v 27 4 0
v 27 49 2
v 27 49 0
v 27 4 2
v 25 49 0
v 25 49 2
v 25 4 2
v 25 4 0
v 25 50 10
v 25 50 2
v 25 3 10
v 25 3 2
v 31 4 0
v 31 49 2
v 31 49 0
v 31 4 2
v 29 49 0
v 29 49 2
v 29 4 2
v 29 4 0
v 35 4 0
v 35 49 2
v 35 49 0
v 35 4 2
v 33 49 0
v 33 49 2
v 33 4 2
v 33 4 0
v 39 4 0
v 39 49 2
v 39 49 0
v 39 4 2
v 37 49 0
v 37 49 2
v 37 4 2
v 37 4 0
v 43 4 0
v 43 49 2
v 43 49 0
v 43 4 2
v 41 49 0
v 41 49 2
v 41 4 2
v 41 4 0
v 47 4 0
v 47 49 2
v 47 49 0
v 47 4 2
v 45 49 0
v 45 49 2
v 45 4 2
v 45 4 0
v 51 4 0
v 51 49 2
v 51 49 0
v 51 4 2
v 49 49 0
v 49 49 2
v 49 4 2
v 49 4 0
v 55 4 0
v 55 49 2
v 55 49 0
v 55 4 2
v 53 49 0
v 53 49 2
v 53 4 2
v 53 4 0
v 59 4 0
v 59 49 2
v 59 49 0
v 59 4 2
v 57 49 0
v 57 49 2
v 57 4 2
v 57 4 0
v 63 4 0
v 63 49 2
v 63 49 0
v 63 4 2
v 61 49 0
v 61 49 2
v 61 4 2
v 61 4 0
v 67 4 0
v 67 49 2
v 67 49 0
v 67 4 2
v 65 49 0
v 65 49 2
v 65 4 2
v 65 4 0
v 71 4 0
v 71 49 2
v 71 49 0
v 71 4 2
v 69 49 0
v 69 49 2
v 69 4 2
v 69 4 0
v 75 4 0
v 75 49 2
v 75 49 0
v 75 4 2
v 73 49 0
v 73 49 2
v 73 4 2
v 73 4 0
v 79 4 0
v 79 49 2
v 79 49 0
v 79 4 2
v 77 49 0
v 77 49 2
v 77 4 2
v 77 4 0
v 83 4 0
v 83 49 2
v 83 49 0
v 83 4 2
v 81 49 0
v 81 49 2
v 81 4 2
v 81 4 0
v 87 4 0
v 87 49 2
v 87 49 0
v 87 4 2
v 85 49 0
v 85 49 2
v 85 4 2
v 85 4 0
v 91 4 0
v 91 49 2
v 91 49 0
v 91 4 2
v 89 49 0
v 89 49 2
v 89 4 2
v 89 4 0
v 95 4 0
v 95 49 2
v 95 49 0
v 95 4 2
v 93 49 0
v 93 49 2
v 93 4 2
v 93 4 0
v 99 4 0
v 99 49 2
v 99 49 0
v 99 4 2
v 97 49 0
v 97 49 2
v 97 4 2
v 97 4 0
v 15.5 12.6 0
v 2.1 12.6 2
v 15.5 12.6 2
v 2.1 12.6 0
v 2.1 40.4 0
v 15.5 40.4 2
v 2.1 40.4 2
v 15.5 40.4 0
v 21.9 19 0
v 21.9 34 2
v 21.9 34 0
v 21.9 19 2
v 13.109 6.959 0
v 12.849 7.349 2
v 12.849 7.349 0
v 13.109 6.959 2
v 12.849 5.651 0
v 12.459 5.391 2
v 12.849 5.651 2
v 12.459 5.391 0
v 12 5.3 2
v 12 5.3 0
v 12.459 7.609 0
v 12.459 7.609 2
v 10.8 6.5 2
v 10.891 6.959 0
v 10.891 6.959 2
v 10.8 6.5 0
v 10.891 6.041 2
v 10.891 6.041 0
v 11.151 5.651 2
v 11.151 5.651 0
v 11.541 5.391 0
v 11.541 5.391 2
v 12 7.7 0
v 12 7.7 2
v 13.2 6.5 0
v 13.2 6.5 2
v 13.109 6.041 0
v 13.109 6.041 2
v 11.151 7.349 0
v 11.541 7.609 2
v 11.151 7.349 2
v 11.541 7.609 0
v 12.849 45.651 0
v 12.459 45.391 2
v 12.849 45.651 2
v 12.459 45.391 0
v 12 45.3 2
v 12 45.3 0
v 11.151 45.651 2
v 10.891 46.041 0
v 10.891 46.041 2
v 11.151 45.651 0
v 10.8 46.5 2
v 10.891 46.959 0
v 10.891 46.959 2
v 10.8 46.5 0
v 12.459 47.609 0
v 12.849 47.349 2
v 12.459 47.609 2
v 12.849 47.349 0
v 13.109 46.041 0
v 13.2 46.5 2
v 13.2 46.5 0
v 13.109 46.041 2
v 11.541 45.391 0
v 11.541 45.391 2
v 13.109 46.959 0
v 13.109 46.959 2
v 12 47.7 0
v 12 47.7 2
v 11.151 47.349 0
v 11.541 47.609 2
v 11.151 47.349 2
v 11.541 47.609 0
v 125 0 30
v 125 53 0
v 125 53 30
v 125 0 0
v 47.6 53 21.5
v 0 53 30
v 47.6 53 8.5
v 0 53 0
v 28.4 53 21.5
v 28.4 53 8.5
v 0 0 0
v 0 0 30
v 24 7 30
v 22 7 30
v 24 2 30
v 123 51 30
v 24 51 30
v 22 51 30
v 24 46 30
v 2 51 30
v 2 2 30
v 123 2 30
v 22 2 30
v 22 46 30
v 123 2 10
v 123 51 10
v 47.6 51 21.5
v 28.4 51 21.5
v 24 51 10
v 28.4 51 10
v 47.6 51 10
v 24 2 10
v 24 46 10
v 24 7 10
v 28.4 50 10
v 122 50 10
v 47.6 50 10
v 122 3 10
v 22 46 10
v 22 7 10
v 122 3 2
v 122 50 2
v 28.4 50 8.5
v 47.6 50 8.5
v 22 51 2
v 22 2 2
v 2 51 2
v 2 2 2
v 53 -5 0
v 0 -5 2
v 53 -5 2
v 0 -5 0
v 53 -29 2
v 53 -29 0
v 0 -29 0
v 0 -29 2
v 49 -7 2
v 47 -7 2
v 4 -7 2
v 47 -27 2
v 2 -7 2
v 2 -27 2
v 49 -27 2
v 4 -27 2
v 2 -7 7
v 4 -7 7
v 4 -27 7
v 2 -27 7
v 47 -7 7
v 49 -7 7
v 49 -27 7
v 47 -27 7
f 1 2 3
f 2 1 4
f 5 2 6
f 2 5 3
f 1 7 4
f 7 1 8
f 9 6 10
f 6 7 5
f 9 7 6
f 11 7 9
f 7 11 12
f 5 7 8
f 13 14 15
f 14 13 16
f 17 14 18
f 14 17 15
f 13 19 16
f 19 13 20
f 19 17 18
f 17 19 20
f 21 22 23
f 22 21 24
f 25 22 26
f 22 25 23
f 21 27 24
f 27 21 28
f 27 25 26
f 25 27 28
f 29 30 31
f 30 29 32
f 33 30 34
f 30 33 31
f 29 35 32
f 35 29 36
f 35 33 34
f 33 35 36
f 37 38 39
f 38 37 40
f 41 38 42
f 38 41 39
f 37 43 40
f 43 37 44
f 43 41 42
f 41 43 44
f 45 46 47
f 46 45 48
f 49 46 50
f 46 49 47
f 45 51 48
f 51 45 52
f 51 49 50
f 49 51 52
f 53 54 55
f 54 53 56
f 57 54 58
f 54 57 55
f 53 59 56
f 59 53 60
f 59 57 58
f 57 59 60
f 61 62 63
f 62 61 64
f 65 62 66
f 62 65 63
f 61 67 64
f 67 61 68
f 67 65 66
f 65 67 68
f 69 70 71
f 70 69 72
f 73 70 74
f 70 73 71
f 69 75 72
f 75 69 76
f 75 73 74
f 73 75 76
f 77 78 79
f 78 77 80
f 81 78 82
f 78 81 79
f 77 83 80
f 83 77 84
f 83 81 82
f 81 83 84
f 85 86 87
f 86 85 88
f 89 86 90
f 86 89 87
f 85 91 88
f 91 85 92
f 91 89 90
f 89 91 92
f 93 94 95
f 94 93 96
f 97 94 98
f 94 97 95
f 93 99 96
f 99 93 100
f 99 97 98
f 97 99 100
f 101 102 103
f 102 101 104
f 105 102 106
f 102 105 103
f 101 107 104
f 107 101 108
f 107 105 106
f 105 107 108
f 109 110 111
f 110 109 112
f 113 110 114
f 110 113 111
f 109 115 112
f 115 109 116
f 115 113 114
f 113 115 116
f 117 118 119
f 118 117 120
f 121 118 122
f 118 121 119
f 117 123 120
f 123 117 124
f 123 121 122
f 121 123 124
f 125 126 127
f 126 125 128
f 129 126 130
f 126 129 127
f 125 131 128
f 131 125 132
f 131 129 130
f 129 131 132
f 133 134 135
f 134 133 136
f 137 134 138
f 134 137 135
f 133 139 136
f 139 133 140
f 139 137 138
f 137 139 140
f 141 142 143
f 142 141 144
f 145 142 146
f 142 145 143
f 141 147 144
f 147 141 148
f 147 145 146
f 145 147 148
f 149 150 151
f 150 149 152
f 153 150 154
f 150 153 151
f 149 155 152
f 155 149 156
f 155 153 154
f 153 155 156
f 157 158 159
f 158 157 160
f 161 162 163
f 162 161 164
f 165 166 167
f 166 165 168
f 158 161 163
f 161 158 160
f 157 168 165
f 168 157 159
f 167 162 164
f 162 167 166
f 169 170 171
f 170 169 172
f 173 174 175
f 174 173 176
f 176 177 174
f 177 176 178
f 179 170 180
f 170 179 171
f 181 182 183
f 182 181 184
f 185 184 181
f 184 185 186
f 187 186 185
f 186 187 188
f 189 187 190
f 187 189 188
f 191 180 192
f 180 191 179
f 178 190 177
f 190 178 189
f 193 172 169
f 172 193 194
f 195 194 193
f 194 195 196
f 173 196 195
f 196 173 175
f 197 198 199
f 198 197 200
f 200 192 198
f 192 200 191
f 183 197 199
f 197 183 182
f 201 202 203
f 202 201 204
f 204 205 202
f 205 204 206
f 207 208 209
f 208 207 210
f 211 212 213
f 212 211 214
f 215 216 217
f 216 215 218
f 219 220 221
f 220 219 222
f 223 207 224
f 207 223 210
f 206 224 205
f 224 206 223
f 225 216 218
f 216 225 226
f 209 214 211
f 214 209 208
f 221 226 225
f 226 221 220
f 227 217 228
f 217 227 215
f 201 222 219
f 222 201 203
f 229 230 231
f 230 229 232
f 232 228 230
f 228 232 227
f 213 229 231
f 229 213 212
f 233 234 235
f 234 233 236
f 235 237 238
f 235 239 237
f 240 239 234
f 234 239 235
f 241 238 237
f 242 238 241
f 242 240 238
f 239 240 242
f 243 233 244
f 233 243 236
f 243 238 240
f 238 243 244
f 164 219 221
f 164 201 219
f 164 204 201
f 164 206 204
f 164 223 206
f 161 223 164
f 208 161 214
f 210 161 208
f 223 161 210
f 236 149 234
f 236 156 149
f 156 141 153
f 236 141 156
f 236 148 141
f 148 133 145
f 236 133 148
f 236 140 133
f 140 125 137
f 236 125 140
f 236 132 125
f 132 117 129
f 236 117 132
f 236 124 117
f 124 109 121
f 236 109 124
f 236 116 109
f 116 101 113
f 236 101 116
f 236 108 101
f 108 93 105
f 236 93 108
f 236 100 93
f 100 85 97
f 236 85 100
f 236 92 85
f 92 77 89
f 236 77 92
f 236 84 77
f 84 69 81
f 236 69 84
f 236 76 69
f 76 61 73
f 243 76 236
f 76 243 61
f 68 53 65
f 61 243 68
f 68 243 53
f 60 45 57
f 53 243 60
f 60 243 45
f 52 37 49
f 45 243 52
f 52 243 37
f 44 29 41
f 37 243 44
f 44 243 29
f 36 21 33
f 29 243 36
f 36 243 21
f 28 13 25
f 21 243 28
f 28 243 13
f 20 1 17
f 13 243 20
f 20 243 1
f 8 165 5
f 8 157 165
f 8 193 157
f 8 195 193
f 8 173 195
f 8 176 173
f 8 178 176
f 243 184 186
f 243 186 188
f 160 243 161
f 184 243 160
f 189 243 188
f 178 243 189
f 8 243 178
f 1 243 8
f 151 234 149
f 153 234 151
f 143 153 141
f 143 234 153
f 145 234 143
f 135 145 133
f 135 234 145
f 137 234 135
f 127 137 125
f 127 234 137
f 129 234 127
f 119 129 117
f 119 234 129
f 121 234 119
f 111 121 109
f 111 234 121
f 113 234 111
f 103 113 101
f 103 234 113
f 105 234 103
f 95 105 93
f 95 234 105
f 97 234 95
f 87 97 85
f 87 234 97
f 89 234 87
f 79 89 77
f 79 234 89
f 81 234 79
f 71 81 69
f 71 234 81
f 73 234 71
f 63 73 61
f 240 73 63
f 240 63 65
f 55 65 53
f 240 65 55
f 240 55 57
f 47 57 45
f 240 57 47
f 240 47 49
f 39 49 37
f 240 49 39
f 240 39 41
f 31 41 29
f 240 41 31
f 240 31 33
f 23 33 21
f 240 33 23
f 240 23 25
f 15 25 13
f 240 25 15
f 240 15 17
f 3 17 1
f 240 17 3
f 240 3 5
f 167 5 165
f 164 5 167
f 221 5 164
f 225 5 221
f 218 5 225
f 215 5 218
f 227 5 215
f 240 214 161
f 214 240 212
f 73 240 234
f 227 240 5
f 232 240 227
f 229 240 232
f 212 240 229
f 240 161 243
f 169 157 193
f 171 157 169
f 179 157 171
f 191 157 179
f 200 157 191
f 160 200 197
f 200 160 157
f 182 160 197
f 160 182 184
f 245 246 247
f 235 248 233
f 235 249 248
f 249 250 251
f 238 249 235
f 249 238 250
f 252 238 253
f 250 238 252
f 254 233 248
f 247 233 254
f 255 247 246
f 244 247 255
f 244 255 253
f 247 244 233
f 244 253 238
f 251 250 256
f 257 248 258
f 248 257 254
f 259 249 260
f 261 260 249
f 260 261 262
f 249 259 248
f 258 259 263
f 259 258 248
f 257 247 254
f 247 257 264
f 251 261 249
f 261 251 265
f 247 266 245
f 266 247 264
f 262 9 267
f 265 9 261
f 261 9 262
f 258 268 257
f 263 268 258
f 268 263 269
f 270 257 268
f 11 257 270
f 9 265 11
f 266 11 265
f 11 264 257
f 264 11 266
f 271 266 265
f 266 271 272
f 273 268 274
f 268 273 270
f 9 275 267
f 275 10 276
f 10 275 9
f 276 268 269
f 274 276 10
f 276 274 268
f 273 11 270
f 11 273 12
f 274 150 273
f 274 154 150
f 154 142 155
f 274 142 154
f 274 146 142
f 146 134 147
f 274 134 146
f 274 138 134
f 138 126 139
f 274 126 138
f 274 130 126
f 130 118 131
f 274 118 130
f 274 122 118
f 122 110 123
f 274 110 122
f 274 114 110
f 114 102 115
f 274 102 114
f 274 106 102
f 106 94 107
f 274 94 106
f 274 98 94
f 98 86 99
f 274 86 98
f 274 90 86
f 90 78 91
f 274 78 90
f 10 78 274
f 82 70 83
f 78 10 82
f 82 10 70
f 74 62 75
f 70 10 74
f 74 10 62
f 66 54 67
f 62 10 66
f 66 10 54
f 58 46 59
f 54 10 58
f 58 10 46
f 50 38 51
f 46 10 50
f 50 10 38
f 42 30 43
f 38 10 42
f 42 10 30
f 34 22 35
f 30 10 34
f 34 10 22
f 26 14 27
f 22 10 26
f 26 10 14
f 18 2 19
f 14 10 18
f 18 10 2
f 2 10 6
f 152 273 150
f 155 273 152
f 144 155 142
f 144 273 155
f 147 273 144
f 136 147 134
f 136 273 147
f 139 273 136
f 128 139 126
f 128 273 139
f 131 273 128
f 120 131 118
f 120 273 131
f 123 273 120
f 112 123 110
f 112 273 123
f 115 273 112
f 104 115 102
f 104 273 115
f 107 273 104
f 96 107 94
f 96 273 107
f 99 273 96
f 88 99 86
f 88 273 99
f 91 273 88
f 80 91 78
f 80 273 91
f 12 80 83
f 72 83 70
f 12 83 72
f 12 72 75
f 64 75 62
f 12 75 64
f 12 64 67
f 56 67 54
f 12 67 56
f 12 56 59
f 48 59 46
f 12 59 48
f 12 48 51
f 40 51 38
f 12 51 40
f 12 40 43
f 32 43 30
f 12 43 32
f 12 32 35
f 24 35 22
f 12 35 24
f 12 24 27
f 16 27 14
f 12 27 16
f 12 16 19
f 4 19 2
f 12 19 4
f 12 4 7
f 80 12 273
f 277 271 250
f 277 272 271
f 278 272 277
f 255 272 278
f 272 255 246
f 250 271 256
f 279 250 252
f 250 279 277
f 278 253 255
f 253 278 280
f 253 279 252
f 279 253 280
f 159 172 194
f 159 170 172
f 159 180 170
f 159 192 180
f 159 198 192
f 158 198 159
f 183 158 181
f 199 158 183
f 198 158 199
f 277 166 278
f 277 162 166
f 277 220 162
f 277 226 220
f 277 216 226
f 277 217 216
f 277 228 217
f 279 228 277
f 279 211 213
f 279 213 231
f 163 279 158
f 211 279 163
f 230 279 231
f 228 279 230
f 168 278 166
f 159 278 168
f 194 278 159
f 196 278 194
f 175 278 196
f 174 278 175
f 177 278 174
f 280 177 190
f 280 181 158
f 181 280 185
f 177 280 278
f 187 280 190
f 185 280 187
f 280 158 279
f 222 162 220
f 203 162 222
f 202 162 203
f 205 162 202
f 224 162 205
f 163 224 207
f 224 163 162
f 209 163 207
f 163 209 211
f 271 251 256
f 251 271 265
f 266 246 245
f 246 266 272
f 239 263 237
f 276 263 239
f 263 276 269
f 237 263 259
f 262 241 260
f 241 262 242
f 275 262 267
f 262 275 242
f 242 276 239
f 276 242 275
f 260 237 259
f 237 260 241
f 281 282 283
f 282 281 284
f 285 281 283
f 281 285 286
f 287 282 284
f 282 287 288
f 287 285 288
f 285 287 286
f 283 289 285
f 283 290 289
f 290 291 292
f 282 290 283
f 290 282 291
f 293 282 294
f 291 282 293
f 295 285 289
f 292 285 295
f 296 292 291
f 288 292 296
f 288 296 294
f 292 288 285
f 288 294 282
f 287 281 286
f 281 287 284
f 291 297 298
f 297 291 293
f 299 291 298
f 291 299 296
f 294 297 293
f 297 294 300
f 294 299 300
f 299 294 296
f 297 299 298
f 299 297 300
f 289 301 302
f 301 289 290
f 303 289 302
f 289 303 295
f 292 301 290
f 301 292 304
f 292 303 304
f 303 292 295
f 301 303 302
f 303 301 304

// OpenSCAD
// Cover for 12V 240W LED PSU with only 2 sides open
// Copyright (C) 2016 Miroslav Hradílek
// Connector code by Martin Neruda <neruda@reprap4u.cz> taken from
// project https://github.com/RepRap4U/RebeliX

// This program is  free software:  you can redistribute it and/or modify it
// under  the terms  of the  GNU General Public License  as published by the
// Free Software Foundation, version 3 of the License.
//
// This program  is  distributed  in the hope  that it will  be useful,  but
// WITHOUT  ANY WARRANTY;  without  even the implied  warranty of MERCHANTA-
// BILITY  or  FITNESS FOR A PARTICULAR PURPOSE.  See the GNU General Public
// License for more details.
//
// You should have received a copy of the  GNU General Public License  along
// with this program. If not, see <http://www.gnu.org/licenses/>.

wt = 2; // Wall thickness
vent_t = 2; // Vent hole thickness

psu_w = 49;  // PSU Width
psu_h = 99;    // PSU Height 
cover_l = 30;  // Cover Length
cover_ml = 20; // Mount length. Length of a psu to disappear in cover
connector_l = 22; // Length of a connector compartment

module psu_connector(){
  difference(){
    cube([27.8,19.8,10],center=true);
    translate([7.5,19.8/2,-10]) rotate([0,0,-45]) cube([20,20,20]);
	translate([-7.5,19.8/2,-10]) rotate([0,0,135]) cube([20,20,20]);
  }
  // Screw holes
  translate([20,0,0]) cylinder(r=1.2,h=20,$fn=16,center=true);
  translate([-20,0,0]) cylinder(r=1.2,h=20,$fn=16,center=true);
}

module switch(){
    cube([19.2,13,10],center=true);
}

module box_cuts() {
    difference() {
        // Outside cuboid
        cube(size = [psu_h + 2*wt + connector_l, cover_l, psu_w + 2*wt], center = false);
        // PSU sized cuboid
        translate([wt + connector_l, -0.1, wt])
            cube(size = [psu_h, cover_ml+0.1, psu_w], center = false);
        // Inside compartment cuboid
        translate([wt + connector_l + 1, -0.1, wt+1])
            cube(size = [psu_h - 2, cover_l - wt + 0.1, psu_w - 2], center = false);
        // Inside compartment for connector
        translate([wt, -0.1, wt])
            cube(size = [connector_l - 2, cover_l - wt + 0.1, psu_w], center = false);
        // Hole between compartments
        translate([connector_l - wt/2, -0.1, wt + 5])
            cube(size = [2*wt, cover_ml+0.1, psu_w - 10], center = false);
        // Vent holes
        for (a =[0: (psu_h - wt - 2 - connector_l)/(2*vent_t)]){
            translate([ connector_l + wt + 1 + a * 2 * vent_t , 0, 2*wt])
                cube(size = [vent_t, cover_l + 0.1 , psu_w - 2*wt], center = false);
        };

        // PSU Connector
        translate([wt+10, cover_l, wt+psu_w/2])
            rotate(a=[90,90,0])
                psu_connector();
        
        // Switch hole
        translate([connector_l+2*wt+12,cover_l-15,psu_w]) rotate([0,0,0]) switch();
    }
}

module psu_cover() {
    box_cuts();
}

// Opening cover
module compartment_cover() {
    union() {
        // Front plate
        cube(size = [wt + connector_l, wt, psu_w + 2*wt], center = false);
        // Inserts
        translate([wt, wt, wt])
            cube(size = [connector_l-wt, 5, wt], center = false);
        translate([wt, wt, psu_w - wt])
            cube(size = [connector_l-wt, 5, wt], center = false);
    }
}

translate([0, 0, cover_l]) rotate([-90,0,0])
    psu_cover();

translate([0, -connector_l -wt -5, 0]) rotate([90,0,90])
    compartment_cover();
